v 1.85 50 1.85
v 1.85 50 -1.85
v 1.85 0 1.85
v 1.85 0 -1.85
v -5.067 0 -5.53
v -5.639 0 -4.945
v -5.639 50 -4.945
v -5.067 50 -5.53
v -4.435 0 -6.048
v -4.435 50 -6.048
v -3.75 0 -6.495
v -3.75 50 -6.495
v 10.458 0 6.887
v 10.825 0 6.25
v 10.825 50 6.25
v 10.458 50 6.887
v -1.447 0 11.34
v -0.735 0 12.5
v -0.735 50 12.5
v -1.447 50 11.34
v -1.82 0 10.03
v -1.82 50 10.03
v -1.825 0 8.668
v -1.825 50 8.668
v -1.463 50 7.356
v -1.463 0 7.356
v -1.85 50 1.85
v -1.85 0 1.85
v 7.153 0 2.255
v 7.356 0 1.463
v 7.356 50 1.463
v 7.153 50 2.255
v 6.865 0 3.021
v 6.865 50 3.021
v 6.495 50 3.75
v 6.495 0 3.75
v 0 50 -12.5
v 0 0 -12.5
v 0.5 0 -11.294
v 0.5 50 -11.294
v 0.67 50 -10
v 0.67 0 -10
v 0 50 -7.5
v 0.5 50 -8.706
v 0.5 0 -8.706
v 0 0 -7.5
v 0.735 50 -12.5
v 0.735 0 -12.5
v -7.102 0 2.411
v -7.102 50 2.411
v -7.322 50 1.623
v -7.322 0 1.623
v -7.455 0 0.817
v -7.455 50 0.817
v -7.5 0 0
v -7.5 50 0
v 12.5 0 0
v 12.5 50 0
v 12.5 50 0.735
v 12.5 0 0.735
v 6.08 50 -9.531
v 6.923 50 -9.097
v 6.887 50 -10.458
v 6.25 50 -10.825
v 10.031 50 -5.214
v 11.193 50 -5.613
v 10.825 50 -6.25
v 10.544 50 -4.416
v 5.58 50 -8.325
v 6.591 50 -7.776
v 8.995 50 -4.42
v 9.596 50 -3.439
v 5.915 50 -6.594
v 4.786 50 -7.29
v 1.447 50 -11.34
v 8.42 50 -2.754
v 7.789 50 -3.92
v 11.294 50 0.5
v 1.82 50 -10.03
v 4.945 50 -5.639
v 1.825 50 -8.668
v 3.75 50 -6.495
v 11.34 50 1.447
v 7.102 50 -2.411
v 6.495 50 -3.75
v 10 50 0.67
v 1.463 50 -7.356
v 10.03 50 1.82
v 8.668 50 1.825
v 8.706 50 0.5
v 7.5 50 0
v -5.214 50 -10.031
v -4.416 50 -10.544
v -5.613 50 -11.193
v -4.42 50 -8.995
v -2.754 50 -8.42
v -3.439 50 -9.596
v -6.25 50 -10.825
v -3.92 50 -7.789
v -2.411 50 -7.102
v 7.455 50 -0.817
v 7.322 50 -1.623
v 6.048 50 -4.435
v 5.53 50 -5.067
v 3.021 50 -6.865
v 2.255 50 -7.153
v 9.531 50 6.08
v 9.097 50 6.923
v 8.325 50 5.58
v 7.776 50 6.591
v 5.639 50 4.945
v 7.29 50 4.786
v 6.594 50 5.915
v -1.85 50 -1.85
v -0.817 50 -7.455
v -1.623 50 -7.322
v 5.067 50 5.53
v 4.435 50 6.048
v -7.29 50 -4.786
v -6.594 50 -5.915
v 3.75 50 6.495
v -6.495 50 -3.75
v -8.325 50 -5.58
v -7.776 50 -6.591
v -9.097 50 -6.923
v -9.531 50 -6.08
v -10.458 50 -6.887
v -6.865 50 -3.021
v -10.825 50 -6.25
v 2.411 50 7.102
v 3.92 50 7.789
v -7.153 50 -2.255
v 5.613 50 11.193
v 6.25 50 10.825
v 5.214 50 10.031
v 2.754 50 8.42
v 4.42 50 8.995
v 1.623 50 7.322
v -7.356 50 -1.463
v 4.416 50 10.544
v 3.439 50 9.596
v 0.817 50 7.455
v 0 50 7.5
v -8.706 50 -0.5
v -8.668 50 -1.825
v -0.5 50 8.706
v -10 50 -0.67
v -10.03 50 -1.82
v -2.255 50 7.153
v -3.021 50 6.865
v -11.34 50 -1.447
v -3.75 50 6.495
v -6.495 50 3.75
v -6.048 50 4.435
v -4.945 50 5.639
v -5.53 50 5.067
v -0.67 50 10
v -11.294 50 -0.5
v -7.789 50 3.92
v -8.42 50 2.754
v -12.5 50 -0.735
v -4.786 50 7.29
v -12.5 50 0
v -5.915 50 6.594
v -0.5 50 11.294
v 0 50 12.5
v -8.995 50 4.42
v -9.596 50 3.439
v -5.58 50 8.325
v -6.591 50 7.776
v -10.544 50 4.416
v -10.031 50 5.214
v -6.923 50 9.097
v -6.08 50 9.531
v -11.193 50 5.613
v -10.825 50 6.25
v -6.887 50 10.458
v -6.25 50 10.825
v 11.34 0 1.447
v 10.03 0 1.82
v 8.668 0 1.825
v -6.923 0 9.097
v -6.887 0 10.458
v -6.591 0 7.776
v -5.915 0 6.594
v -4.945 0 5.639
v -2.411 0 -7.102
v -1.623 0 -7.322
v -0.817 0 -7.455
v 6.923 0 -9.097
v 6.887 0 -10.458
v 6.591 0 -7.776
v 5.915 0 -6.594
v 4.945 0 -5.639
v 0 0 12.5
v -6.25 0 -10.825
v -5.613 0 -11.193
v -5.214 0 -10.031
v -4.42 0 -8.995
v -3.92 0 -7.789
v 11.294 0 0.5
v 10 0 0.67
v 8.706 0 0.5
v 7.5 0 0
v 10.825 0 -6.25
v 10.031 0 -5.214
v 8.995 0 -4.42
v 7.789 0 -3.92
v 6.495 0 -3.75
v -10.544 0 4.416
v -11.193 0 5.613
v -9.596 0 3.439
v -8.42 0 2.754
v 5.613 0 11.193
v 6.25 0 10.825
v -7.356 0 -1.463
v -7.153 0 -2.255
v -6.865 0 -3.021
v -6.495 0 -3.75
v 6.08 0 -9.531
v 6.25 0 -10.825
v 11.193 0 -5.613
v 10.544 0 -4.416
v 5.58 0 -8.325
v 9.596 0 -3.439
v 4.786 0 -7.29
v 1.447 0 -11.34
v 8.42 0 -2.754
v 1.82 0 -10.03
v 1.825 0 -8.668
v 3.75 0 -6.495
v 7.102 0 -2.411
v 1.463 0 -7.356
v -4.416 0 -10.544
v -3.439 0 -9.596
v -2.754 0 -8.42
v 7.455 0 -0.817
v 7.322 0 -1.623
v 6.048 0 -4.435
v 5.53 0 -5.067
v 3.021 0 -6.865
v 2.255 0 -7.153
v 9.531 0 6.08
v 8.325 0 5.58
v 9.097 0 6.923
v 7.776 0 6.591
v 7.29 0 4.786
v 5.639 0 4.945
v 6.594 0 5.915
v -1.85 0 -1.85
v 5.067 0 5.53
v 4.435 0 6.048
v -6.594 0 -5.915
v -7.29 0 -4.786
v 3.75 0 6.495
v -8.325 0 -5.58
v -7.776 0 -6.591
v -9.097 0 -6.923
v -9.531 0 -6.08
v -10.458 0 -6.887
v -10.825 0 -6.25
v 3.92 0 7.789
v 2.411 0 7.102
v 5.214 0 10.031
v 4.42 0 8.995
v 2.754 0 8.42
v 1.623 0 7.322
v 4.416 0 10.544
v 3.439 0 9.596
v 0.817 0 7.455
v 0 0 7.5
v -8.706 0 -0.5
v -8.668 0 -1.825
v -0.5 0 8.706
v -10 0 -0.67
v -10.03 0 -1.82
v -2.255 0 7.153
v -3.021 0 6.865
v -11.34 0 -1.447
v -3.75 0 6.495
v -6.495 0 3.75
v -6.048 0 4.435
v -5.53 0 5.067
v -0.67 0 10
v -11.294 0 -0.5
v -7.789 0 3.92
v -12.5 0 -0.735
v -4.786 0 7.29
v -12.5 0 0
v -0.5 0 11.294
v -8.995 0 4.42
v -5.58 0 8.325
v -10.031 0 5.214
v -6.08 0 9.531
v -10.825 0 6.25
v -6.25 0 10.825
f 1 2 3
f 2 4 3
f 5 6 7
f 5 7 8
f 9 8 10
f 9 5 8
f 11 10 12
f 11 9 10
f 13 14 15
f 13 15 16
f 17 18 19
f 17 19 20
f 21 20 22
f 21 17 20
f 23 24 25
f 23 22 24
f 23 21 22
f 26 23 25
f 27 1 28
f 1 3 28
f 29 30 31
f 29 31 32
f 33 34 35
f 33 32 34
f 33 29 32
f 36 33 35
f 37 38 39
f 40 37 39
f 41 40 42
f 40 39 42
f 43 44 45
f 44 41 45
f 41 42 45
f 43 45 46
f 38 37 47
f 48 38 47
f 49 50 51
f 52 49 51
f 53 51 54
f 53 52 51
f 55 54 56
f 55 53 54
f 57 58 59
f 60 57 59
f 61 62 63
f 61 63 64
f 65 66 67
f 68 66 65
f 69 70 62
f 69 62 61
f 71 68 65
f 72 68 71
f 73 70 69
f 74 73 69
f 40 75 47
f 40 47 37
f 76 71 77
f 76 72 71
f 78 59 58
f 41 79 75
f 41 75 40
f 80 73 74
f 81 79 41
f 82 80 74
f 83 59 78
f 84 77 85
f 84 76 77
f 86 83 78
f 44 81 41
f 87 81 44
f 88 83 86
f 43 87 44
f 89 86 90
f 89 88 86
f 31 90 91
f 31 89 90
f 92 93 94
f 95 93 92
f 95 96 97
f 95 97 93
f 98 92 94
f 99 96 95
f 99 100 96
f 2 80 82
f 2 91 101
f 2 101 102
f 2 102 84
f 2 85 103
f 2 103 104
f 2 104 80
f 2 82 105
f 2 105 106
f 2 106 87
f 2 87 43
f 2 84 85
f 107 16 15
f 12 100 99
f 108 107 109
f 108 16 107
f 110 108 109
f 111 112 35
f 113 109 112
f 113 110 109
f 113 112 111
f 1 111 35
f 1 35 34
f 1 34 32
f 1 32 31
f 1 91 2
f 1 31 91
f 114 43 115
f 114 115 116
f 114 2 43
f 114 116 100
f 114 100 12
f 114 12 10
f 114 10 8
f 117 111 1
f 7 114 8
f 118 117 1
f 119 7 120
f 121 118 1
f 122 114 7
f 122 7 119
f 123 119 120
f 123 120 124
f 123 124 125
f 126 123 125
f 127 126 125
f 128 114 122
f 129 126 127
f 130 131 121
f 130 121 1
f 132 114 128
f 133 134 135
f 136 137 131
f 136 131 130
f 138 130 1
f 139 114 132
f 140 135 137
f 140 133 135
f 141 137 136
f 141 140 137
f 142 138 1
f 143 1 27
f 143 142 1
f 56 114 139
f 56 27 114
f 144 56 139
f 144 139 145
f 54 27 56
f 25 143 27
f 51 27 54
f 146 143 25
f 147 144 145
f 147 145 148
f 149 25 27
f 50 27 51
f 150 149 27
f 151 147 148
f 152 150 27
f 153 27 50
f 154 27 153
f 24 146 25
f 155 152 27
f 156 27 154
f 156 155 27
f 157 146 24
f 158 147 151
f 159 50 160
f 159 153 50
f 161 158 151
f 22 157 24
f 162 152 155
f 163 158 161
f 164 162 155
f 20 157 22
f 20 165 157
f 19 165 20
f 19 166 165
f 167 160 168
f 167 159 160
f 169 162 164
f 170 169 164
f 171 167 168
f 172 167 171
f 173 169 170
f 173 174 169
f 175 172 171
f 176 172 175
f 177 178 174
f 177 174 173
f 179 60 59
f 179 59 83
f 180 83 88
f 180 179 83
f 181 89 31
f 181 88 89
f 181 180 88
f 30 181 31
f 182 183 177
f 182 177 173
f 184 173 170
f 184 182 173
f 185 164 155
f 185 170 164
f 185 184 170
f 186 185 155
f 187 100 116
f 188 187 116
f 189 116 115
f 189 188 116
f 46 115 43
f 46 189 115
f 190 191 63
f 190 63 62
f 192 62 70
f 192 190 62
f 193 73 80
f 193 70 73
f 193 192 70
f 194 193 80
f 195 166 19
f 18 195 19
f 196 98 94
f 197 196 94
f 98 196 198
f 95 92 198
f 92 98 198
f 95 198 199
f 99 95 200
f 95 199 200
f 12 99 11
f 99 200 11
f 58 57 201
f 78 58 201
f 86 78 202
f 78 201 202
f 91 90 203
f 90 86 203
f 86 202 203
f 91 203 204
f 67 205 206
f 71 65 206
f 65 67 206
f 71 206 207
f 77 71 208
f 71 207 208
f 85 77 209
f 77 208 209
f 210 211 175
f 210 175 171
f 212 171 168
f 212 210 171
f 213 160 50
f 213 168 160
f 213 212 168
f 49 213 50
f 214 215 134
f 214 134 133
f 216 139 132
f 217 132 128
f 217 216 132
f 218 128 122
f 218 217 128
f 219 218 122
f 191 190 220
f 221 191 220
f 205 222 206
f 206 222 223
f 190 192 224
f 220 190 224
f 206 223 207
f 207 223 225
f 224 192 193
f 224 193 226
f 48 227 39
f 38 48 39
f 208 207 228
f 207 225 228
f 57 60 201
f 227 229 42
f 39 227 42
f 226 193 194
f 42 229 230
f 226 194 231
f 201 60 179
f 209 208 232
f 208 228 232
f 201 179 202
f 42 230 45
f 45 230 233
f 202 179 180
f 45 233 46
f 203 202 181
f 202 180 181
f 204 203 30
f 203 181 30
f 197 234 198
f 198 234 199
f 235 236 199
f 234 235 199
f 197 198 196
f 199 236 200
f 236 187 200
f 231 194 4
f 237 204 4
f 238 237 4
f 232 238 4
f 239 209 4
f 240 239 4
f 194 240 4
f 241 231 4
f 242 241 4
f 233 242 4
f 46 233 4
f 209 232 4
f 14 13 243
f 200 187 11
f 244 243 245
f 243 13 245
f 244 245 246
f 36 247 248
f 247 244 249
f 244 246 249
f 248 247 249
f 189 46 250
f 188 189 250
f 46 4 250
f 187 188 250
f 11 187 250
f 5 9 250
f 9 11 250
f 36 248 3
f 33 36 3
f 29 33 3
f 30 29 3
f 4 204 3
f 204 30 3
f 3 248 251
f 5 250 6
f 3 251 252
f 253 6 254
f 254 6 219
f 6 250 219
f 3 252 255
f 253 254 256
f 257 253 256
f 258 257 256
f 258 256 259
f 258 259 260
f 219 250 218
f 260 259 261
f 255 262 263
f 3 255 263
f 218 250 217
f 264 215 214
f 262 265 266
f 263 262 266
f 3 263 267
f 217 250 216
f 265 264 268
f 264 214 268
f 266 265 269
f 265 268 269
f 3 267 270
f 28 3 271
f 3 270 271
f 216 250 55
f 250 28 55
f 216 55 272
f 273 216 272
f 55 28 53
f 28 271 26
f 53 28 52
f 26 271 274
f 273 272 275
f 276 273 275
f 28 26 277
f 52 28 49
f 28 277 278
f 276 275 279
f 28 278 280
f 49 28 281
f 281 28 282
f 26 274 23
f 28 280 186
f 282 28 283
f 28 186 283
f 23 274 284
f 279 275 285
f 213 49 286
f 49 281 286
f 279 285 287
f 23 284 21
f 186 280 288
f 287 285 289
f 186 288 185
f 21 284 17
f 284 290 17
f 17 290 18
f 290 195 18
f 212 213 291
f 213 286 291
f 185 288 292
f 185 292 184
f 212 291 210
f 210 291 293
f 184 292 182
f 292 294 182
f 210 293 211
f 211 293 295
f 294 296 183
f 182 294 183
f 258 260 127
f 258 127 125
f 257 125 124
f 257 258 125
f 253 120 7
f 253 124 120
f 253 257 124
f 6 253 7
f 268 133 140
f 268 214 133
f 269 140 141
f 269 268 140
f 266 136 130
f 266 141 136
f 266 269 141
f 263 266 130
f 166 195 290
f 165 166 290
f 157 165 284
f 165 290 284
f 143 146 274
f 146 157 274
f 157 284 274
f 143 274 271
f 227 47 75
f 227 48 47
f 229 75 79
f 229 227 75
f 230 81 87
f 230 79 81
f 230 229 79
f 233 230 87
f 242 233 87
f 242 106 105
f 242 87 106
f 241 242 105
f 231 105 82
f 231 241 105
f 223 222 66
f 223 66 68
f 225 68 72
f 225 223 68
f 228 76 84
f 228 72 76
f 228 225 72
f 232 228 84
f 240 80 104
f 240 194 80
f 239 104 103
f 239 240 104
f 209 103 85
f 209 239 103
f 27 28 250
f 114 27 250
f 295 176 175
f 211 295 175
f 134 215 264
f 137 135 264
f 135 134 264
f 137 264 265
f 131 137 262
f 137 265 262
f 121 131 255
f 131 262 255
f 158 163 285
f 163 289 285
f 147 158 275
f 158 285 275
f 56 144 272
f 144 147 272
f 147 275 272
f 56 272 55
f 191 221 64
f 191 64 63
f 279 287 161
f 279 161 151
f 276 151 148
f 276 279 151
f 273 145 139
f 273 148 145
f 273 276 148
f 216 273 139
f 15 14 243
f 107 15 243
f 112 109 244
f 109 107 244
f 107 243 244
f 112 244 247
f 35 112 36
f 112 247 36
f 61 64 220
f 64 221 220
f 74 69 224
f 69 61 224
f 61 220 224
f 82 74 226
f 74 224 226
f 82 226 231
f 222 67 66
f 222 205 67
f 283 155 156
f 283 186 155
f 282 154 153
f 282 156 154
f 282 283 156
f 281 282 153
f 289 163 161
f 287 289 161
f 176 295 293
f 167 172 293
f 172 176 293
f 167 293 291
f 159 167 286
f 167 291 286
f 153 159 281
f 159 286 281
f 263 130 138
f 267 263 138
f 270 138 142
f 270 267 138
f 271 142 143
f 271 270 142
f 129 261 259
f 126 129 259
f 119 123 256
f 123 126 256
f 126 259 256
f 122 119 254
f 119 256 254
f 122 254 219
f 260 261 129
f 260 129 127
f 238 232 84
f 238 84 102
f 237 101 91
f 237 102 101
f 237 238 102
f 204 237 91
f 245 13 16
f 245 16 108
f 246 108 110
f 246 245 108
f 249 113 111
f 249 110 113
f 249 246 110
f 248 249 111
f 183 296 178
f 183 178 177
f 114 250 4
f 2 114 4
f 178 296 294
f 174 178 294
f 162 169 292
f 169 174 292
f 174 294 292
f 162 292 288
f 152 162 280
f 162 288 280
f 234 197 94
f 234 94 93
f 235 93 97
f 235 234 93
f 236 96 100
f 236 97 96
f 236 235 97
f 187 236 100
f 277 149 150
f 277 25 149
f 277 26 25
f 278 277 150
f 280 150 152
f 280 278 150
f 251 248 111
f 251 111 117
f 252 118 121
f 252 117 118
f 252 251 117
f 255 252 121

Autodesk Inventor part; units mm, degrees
ref_plane "YZ Plane" through (0, 0, 0) normal (1, 0, 0) x (0, 1, 0)
ref_plane "XZ Plane" through (0, 0, 0) normal (0, 1, 0) x (-1, 0, 0)
ref_plane "XY Plane" through (0, 0, 0) normal (0, 0, 1) x (1, 0, 0)
sketch "Sketch1" plane through (0, 0, 0) normal (0, 1, 0) x (-1, 0, 0)
  circle A0 centre (0, 0) radius 7.5
  line L0 (1.5, 1.5) -> (-1.5, -1.5) construction
  line L1 (-1.5, 1.5) -> (1.5, -1.5) construction
  arc A1 (7.5, 0) -> (12.5, 0) centre (10, 4.3301) ccw
  line L2 (0, 0) -> (5.3033, -5.3033)
  line L3 (0, 0) -> (6.9291, -2.8701)
  line L4 (0, 0) -> (7.5, 0) construction
  line L5 (0, 0) -> (7.3559, -1.4632)
  line L6 (0, 0) -> (7.5, 0) construction
  line L7 (0, 0) -> (7.4639, -0.7351)
  line L8 (0, 0) -> (7.5, 0) construction
  line L9 (12.5, 0) -> (12.5, -0.7351)
  arc A2 (7.4639, -0.7351) -> (7.5, 0) centre (0, 0) ccw
  arc A3 (7.3559, -1.4632) -> (12.5, -0.7351) centre (9.3293, 3.1309) ccw
  arc A4 (6.4952, 3.75) -> (10.8253, 6.25) centre (6.4952, 8.75) ccw
  line L10 (10.8253, 6.25) -> (11.1929, 5.6134)
  arc A5 (7.102, 2.4108) -> (11.1929, 5.6134) centre (6.5139, 7.3761) ccw
  arc A6 (3.75, 6.4952) -> (6.25, 10.8253) centre (1.25, 10.8253) ccw
  line L11 (6.25, 10.8253) -> (6.8866, 10.4578)
  arc A7 (4.9451, 5.6388) -> (6.8866, 10.4578) centre (1.9532, 9.6448) ccw
  arc A8 (0, 7.5) -> (0, 12.5) centre (-4.3301, 10) ccw
  line L12 (0, 12.5) -> (0.7351, 12.5)
  arc A9 (1.4632, 7.3559) -> (0.7351, 12.5) centre (-3.1309, 9.3293) ccw
  arc A10 (-3.75, 6.4952) -> (-6.25, 10.8253) centre (-8.75, 6.4952) ccw
  line L13 (-6.25, 10.8253) -> (-5.6134, 11.1929)
  arc A11 (-2.4108, 7.102) -> (-5.6134, 11.1929) centre (-7.3761, 6.5139) ccw
  arc A12 (-6.4952, 3.75) -> (-10.8253, 6.25) centre (-10.8253, 1.25) ccw
  line L14 (-10.8253, 6.25) -> (-10.4578, 6.8866)
  arc A13 (-5.6388, 4.9451) -> (-10.4578, 6.8866) centre (-9.6448, 1.9532) ccw
  arc A14 (-7.5, 0) -> (-12.5, 0) centre (-10, -4.3301) ccw
  line L15 (-12.5, 0) -> (-12.5, 0.7351)
  arc A15 (-7.3559, 1.4632) -> (-12.5, 0.7351) centre (-9.3293, -3.1309) ccw
  arc A16 (-6.4952, -3.75) -> (-10.8253, -6.25) centre (-6.4952, -8.75) ccw
  line L16 (-10.8253, -6.25) -> (-11.1929, -5.6134)
  arc A17 (-7.102, -2.4108) -> (-11.1929, -5.6134) centre (-6.5139, -7.3761) ccw
  arc A18 (-3.75, -6.4952) -> (-6.25, -10.8253) centre (-1.25, -10.8253) ccw
  line L17 (-6.25, -10.8253) -> (-6.8866, -10.4578)
  arc A19 (-4.9451, -5.6388) -> (-6.8866, -10.4578) centre (-1.9532, -9.6448) ccw
  arc A20 (0, -7.5) -> (0, -12.5) centre (4.3301, -10) ccw
  line L18 (0, -12.5) -> (-0.7351, -12.5)
  arc A21 (-1.4632, -7.3559) -> (-0.7351, -12.5) centre (3.1309, -9.3293) ccw
  arc A22 (3.75, -6.4952) -> (6.25, -10.8253) centre (8.75, -6.4952) ccw
  line L19 (6.25, -10.8253) -> (5.6134, -11.1929)
  arc A23 (2.4108, -7.102) -> (5.6134, -11.1929) centre (7.3761, -6.5139) ccw
  arc A24 (6.4952, -3.75) -> (10.8253, -6.25) centre (10.8253, -1.25) ccw
  line L20 (10.8253, -6.25) -> (10.4578, -6.8866)
  arc A25 (5.6388, -4.9451) -> (10.4578, -6.8866) centre (9.6448, -1.9532) ccw
  line L21 (1.85, -1.85) -> (-1.85, -1.85)
  line L22 (-1.85, -1.85) -> (-1.85, 1.85)
  line L23 (-1.85, 1.85) -> (1.85, 1.85)
  line L24 (1.85, 1.85) -> (1.85, -1.85)
  line L25 (1.85, -1.85) -> (-1.85, 1.85) construction
  line L26 (-1.85, -1.85) -> (1.85, 1.85) construction
  point P0 (7.102, 2.4108)
  point P1 (6.4952, 3.75)
  point P2 (4.9451, 5.6388)
  point P3 (3.75, 6.4952)
  point P4 (1.4632, 7.3559)
  point P5 (0, 7.5)
  point P6 (-2.4108, 7.102)
  point P7 (-3.75, 6.4952)
  point P8 (-5.6388, 4.9451)
  point P9 (-6.4952, 3.75)
  point P10 (-7.3559, 1.4632)
  point P11 (-7.5, 0)
  point P12 (-1.4632, -7.3559)
  point P13 (0, -7.5)
  point P14 (2.4108, -7.102)
  point P15 (3.75, -6.4952)
  dimension "d0" = 15
  dimension "d1" = 3
  dimension "d2" = 3
  dimension "d3" = 5
  dimension "d4" = 5
  dimension "d5" = 22.5
  dimension "d6" = 11.25
  dimension "d7" = 5.625
  dimension "d13" = 5
  dimension "d16" = 360
  dimension "d20" = 3.7
  dimension "d21" = 3.7
extrude "Extrusion1" add sketch "Sketch1" along normal blind 50 contours A0 L7 L24 L23 L22 L21 L2 | A1 L9 A3 A0 | A0 A4 L10 A5 | A0 L5 L24 L7 | A0 L3 L24 L5 | A0 A6 L11 A7 | A0 L2 L24 L3 | A24 L20 A25 A0 | A0 A8 L12 A9 | A22 L19 A23 A0 | A0 A10 L13 A11 | A20 L18 A21 A0 | A0 A12 L14 A13 | A18 L17 A19 A0 | A0 A14 L15 A15 | A16 L16 A17 A0
sketch "Sketch2" plane through (12.5, 0, 0) normal (1, 0, 0) x (0, 0, -1)
  point P0 (0, 0)
sketch "Sketch3" plane through (0, 50, 0) normal (0, 1, 0) x (1, 0, 0)
  point P0 (0, 0)
sketch "Sketch4" plane through (-6.25, 0, 10.8253) normal (-0.5, 0, 0.866) x (0.866, 0, 0.5)
  point P0 (0, 0)
sketch "Sketch5" plane through (0, 50, 0) normal (0, 1, 0) x (1, 0, 0)
  point P0 (0, 0)
equation "\"BendRadius\" = Thickness"
equation "\"BendReliefWidth\" = Thickness"
equation "\"BendReliefDepth\" = 0.5 * Thickness"
equation "\"CornerReliefSize\" = 4 * Thickness"
equation "\"MinimumRemnant\" = 2 * Thickness"
equation "\"TransitionRadius\" = BendRadius"
equation "\"JacobiRadiusSize\" = BendRadius"
equation "\"GapSize\" = Thickness"
equation "\"Thickness\" = 0.5"
